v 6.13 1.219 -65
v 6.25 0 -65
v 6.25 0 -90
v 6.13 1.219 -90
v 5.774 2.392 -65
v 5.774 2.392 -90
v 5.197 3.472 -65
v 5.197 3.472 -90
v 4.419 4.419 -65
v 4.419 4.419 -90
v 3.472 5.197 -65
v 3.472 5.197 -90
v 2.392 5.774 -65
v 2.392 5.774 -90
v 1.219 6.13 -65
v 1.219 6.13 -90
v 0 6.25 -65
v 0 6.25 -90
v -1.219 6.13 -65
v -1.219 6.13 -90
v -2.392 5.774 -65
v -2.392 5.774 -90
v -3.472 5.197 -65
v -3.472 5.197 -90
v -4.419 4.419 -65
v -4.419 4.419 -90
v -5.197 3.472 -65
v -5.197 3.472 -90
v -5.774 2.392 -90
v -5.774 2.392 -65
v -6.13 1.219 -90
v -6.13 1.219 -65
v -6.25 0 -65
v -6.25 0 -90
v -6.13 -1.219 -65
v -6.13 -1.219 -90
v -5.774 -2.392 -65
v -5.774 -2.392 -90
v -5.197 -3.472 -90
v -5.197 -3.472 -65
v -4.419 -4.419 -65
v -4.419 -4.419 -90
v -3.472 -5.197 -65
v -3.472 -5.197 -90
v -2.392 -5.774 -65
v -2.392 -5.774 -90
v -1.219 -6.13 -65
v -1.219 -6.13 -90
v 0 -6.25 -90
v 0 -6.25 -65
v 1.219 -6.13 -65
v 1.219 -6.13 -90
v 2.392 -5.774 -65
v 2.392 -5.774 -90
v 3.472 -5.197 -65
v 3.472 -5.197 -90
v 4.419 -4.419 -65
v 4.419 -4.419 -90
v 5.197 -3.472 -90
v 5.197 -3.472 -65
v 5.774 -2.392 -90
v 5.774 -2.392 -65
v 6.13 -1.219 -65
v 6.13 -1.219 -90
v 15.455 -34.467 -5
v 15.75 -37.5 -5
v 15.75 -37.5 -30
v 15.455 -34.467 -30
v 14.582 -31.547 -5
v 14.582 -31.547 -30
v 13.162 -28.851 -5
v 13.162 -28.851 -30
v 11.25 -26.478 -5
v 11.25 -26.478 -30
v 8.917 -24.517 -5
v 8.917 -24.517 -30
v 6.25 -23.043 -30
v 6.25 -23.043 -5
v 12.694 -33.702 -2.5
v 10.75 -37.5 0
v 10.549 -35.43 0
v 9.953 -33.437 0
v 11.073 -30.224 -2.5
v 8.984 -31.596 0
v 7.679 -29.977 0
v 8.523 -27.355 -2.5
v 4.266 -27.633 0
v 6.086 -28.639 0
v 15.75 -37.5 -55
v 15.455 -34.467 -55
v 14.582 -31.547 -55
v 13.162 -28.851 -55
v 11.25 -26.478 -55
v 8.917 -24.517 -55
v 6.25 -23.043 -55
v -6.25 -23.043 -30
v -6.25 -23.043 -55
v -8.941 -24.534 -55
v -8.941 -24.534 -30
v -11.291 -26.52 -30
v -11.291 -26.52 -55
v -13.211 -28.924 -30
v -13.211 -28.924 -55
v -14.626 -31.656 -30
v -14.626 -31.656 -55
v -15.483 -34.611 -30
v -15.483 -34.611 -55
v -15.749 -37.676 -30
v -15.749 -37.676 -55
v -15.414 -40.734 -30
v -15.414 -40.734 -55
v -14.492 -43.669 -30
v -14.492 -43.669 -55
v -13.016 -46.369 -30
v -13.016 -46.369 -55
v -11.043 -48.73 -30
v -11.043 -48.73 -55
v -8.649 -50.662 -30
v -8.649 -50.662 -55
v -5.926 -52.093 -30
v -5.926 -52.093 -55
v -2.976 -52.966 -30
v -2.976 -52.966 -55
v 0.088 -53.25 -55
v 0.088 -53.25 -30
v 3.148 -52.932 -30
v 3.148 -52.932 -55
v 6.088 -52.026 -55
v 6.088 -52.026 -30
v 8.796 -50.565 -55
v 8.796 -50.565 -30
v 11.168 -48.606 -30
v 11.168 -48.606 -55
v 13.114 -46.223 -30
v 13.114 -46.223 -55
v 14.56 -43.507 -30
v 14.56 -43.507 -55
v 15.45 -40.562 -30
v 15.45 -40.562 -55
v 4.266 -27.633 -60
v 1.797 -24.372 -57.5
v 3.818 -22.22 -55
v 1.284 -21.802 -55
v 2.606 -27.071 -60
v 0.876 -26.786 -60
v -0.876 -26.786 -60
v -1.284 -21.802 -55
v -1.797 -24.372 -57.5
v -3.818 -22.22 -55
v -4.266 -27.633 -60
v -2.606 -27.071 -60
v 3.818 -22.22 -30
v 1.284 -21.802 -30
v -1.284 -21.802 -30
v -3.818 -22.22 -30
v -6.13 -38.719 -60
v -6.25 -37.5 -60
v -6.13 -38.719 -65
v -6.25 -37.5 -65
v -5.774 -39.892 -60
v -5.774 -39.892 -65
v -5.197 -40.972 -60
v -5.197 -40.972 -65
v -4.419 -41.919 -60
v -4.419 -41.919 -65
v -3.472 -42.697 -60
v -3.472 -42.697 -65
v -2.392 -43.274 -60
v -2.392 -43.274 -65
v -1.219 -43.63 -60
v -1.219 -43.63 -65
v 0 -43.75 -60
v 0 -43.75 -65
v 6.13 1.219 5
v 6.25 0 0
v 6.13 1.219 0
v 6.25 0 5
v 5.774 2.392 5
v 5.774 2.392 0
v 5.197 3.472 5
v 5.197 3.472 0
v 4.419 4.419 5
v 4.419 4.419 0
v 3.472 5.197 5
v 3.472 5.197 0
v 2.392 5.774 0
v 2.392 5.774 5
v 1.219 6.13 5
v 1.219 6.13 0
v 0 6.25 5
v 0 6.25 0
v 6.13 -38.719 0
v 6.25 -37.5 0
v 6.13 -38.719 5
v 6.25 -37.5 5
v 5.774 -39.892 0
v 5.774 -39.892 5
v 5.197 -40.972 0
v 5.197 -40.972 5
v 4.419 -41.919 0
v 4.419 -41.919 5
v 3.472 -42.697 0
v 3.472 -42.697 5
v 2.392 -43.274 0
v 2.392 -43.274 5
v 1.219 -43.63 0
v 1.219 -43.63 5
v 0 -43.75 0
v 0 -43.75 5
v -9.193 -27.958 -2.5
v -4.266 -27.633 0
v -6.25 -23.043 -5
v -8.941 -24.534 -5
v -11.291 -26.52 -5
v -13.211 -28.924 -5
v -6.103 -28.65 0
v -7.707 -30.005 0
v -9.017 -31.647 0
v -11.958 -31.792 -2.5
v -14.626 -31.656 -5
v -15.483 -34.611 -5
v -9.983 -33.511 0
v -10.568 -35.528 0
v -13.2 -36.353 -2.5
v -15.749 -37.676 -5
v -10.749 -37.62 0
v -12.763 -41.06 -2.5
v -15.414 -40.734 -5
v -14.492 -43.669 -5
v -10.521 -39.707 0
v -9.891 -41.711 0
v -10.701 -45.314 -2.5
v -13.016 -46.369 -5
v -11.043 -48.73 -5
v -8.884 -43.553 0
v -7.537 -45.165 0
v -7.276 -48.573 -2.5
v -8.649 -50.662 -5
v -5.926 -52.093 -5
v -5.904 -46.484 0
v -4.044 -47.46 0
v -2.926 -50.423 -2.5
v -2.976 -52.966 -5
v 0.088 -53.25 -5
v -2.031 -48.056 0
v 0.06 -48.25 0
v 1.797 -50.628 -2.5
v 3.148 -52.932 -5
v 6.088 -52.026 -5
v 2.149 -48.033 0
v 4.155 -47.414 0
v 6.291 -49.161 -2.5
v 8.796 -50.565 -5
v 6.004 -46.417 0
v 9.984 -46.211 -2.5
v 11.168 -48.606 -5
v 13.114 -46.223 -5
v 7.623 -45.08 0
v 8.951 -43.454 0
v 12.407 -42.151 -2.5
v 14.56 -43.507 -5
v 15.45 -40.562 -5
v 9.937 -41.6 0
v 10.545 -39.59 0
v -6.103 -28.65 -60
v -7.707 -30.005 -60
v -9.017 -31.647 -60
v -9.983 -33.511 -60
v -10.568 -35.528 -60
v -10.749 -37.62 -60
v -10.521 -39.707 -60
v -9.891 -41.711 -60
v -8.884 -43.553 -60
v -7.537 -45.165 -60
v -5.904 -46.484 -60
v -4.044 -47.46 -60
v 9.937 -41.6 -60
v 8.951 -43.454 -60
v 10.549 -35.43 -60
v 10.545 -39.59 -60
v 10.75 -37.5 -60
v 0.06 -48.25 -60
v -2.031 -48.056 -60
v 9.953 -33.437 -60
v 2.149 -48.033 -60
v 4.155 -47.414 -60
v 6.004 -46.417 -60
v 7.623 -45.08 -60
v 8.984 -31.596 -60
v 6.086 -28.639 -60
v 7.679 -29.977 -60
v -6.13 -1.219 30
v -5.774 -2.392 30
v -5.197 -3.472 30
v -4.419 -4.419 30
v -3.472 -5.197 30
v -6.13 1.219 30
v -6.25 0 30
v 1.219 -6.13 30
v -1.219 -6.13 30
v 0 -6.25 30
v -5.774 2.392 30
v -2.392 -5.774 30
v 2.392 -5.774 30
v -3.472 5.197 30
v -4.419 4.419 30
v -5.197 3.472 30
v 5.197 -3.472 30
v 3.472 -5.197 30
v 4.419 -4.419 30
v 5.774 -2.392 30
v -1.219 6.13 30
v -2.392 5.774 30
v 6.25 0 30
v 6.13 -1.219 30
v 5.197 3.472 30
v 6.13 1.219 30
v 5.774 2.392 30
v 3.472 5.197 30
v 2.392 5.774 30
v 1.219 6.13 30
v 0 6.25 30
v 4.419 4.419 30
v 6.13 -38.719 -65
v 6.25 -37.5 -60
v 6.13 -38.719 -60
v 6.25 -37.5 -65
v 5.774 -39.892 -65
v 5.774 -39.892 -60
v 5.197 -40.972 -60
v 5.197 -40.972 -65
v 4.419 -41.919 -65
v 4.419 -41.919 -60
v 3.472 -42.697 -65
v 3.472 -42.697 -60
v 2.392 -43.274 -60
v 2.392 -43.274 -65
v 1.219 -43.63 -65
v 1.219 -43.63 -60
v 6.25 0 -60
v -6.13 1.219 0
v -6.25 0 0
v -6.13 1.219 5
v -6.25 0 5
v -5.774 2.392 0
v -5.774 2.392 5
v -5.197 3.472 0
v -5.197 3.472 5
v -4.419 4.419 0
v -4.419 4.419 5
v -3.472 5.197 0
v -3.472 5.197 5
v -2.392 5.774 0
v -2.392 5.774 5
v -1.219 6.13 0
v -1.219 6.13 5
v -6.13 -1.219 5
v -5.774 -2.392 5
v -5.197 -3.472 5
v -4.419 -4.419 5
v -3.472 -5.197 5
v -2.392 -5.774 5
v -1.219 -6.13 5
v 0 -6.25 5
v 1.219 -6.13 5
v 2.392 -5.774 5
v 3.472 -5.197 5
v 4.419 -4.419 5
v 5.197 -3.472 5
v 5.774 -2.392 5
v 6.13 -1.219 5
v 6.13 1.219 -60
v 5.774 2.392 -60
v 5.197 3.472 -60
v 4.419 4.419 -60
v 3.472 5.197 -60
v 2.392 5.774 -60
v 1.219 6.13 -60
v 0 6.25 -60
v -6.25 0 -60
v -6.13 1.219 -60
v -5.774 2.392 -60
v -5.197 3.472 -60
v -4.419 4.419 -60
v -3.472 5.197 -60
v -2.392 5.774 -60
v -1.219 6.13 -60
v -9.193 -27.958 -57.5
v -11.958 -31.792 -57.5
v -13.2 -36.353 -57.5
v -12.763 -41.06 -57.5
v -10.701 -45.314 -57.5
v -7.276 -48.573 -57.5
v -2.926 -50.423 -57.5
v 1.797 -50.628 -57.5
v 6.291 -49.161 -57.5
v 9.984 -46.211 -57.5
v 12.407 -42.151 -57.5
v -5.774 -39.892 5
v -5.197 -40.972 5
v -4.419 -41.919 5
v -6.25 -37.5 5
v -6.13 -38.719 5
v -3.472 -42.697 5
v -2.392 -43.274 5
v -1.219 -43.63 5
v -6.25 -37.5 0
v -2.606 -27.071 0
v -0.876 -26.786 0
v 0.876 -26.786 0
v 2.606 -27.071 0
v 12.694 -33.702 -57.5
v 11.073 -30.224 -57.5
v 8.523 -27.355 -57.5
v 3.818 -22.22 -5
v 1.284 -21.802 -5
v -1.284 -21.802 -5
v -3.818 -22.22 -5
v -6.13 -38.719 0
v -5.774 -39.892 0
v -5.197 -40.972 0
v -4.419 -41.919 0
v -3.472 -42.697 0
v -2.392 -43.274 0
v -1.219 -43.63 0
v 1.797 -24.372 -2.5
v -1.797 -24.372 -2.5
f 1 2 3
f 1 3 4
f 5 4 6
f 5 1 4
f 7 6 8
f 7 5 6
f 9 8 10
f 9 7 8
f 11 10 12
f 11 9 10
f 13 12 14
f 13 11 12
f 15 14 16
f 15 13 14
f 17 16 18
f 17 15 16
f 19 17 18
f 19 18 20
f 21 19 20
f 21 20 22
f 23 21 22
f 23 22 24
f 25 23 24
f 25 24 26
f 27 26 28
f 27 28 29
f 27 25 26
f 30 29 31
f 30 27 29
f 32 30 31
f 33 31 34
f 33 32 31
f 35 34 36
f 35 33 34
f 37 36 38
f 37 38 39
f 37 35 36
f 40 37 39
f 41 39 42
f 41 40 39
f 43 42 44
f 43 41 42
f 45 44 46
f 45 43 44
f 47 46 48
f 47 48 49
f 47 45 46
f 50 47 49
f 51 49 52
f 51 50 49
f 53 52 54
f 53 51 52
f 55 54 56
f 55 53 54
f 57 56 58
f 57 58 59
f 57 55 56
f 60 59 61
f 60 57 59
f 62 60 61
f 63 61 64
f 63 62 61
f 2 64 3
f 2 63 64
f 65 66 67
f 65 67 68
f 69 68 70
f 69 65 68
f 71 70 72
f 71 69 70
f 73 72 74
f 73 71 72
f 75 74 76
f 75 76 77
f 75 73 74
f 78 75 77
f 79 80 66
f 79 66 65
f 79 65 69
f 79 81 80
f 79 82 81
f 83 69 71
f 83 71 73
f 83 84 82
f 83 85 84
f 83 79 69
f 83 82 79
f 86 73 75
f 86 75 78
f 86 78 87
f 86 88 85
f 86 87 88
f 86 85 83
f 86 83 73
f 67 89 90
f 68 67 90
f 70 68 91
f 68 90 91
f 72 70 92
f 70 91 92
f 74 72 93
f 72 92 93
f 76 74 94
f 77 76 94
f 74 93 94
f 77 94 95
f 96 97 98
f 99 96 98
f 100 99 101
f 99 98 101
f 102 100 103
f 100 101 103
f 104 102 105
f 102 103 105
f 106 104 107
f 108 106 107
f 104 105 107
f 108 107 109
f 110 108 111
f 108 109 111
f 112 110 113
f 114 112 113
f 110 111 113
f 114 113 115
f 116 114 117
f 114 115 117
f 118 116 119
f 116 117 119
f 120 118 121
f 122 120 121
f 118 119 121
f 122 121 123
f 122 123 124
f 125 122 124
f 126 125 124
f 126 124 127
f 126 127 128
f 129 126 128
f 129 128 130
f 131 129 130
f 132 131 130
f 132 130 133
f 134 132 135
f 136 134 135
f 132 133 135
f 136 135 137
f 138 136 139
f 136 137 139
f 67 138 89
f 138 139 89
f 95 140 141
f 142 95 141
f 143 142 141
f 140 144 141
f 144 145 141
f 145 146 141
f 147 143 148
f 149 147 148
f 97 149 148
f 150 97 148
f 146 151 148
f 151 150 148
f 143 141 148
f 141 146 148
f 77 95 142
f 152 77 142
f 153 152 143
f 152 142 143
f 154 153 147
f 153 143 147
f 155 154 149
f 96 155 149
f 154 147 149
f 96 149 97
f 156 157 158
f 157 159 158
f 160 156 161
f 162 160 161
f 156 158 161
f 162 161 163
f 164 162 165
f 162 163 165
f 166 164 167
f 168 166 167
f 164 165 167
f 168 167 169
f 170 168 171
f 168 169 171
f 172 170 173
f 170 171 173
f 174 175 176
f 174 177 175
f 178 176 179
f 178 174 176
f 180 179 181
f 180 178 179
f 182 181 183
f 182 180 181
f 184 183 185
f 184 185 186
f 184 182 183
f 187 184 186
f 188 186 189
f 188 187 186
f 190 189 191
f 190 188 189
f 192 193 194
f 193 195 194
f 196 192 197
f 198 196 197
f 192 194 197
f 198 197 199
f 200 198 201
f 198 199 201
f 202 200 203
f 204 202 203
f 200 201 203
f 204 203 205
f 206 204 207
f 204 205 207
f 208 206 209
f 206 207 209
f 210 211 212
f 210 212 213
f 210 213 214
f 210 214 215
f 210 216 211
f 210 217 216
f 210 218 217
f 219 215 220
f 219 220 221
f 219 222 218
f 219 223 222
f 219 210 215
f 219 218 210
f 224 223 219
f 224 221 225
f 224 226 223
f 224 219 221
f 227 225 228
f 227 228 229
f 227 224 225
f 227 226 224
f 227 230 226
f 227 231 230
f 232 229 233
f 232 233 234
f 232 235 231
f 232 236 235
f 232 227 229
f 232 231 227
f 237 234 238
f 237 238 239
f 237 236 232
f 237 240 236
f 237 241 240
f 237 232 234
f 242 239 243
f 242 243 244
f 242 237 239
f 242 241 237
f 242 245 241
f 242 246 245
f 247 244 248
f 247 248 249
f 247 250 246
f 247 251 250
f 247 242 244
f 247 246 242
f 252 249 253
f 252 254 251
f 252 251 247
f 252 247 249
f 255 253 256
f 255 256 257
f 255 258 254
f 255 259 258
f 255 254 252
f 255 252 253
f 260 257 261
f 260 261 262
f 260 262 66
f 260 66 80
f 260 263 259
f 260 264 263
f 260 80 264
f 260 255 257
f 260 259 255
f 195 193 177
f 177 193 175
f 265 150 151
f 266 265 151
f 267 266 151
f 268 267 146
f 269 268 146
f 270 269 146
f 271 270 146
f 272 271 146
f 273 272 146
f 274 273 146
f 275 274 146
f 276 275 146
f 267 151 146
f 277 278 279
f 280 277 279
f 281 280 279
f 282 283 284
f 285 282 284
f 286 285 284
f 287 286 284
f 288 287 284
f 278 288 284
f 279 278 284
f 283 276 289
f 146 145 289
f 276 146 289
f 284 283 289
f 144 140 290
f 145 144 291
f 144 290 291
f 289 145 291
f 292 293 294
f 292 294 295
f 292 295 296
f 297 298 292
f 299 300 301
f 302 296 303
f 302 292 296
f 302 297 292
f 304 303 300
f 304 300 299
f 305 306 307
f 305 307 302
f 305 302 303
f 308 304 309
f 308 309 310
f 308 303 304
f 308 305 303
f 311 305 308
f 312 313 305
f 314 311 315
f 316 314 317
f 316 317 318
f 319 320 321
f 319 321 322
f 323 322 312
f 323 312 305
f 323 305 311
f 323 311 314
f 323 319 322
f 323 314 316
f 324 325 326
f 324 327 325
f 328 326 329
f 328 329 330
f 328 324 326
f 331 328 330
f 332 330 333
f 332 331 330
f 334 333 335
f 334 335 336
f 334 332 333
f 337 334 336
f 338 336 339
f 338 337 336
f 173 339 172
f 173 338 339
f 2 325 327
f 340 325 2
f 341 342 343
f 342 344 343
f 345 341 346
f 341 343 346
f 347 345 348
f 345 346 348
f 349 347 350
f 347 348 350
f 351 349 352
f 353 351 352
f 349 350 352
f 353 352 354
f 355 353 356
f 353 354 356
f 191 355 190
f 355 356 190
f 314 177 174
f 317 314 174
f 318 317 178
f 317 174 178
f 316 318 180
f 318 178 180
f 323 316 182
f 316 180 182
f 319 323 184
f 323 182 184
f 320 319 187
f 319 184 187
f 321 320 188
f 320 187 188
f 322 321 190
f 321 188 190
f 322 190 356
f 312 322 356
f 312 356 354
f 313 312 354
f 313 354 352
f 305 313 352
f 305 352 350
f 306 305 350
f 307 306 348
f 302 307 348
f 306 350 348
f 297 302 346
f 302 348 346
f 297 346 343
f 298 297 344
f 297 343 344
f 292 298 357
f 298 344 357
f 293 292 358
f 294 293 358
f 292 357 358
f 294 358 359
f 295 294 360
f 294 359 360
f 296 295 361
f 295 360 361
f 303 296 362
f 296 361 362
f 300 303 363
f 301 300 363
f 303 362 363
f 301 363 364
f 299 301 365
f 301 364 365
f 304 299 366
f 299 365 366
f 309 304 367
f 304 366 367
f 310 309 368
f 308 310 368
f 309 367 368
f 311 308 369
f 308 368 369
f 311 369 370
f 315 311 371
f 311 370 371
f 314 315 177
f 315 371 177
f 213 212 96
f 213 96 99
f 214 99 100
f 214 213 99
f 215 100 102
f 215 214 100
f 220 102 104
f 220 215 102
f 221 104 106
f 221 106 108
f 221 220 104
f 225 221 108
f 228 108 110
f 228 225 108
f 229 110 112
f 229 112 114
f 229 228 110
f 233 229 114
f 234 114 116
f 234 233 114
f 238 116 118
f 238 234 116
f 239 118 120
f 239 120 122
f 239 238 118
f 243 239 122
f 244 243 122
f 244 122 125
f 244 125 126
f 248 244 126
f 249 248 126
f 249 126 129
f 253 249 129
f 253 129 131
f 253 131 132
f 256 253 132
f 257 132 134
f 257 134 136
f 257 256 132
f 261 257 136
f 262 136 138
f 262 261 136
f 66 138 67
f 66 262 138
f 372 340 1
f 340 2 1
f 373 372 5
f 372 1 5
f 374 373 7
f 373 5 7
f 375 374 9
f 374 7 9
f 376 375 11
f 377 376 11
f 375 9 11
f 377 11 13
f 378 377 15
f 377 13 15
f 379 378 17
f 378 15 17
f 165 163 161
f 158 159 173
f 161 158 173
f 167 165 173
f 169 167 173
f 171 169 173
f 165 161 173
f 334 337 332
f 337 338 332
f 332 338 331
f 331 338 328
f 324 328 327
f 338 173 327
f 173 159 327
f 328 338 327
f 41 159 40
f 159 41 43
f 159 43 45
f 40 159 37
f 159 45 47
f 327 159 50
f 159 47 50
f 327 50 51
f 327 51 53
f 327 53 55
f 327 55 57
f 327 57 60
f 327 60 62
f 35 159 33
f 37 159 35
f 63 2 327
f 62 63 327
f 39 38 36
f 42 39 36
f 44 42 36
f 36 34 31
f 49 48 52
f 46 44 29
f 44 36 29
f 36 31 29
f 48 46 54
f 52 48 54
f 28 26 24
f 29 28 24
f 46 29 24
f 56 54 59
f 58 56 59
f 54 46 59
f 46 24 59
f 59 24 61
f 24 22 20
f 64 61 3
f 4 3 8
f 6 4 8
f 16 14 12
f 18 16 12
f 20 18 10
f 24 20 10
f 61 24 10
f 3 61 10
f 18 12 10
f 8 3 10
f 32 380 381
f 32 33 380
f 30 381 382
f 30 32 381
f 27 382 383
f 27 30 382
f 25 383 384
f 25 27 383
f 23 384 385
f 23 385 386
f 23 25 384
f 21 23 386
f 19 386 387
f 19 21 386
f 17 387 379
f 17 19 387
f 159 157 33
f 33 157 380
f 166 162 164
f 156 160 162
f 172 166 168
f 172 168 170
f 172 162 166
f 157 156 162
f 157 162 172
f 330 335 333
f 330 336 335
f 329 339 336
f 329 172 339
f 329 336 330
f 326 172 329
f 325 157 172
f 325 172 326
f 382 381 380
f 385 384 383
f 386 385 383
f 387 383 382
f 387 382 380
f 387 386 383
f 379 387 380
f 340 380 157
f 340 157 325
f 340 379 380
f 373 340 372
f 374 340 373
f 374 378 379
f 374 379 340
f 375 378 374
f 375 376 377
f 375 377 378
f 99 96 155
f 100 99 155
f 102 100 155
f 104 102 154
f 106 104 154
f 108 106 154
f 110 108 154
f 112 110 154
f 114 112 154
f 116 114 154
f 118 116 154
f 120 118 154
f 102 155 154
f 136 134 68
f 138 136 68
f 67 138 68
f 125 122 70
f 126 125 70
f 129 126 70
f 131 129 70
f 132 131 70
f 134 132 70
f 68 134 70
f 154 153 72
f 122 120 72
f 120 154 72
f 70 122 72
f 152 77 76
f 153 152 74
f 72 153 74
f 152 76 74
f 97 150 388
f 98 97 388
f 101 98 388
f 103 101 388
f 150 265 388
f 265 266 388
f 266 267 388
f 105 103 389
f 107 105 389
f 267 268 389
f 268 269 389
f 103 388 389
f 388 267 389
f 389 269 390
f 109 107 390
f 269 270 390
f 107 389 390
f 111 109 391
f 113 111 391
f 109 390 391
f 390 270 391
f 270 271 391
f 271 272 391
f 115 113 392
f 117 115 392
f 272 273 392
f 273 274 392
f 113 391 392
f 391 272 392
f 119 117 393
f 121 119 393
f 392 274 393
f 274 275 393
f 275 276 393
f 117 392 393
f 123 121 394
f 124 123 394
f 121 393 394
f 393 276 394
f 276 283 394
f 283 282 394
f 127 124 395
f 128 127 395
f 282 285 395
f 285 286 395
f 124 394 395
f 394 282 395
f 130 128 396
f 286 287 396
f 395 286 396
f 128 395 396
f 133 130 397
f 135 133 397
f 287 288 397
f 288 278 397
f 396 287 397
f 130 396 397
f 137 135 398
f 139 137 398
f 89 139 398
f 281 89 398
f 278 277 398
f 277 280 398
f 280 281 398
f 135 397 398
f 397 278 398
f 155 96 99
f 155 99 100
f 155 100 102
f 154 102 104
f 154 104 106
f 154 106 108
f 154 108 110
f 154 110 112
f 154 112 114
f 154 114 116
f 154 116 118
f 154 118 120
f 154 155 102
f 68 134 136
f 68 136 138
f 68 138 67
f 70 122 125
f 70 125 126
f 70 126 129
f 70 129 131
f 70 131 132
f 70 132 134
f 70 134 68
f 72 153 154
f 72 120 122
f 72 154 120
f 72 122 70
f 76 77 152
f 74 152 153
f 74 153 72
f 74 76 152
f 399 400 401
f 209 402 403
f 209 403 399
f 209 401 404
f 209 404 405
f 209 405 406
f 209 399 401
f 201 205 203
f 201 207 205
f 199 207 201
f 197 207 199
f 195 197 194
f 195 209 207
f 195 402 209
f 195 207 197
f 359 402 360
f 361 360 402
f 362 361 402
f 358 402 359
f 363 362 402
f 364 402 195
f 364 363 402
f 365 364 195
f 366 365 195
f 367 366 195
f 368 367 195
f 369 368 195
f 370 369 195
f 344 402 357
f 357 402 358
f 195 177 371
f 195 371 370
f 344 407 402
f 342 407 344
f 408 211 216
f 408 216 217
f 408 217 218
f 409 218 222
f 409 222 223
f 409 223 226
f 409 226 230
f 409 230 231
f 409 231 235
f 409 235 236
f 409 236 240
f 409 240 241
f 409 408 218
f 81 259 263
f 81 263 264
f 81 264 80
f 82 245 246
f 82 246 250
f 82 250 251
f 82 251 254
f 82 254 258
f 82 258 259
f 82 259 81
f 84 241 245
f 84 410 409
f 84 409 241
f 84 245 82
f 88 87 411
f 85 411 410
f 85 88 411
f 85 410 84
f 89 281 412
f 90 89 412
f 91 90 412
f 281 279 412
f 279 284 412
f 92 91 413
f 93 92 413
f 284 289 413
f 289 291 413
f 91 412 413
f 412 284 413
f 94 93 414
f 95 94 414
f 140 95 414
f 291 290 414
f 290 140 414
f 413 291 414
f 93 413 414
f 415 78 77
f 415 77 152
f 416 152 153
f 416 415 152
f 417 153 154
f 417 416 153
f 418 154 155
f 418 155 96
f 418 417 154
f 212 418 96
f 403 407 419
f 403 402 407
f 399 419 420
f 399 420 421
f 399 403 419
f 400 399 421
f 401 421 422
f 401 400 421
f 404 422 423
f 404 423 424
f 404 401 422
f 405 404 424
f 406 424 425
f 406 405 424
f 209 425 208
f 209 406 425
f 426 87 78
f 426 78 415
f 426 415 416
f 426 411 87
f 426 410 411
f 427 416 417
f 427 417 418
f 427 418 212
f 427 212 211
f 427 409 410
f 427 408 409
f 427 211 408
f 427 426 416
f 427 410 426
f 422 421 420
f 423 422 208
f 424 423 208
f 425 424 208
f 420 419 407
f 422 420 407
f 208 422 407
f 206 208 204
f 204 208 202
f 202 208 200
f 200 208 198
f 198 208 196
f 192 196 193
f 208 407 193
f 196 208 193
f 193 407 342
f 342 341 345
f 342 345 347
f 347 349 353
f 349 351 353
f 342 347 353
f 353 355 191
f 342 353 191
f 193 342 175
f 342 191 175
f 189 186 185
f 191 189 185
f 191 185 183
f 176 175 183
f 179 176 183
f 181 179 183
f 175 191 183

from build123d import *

# Parameters (mm, degrees)
SKETCH1_R           = 6.25
BOSS_EXTRUDE1_DEPTH = 30
SKETCH1_3_W         = 12.5
SKETCH1_3_H         = 50
BOSS_EXTRUDE2_DEPTH = 5
BOSS_EXTRUDE3_DEPTH = 30
CHAMFER1_SIZE       = 5
FILLET1_R           = 6.25


with BuildPart() as part:
    # Sketch1 → Boss-Extrude1 (new body)
    with BuildSketch(Plane.XY):
        Circle(SKETCH1_R)
    extrude(amount=BOSS_EXTRUDE1_DEPTH)

    # Sketch1<3> → Boss-Extrude2 (add)
    with BuildSketch(Plane.XY):
        with Locations((0, -18.75)):
            Rectangle(SKETCH1_3_W, SKETCH1_3_H)
    extrude(amount=BOSS_EXTRUDE2_DEPTH)

    # Fillet1
    fillet1_edges = [part.edges().sort_by_distance(p)[0] for p in [
        (-6.25, -43.75, 2.5),
        (-6.25, 6.25, 2.5),
        (6.25, -43.75, 2.5),
        (6.25, 6.25, 2.5),
    ]]
    fillet(fillet1_edges, radius=FILLET1_R - 0.0001)  # a hair under: the kernel refuses the full size


with BuildPart() as body_2:
    # Sketch1<4> → Boss-Extrude3 (new body)
    with BuildSketch(Plane.XY):
        with BuildLine():
            ThreePointArc((6.25, -23.043167705), (0, -21.75), (-6.25, -23.043167705))
            Line((-6.25, -23.043167705), (-6.25, -43.75))
            Line((-6.25, -43.75), (6.25, -43.75))
            Line((6.25, -43.75), (6.25, -23.043167705))
        make_face()
        with BuildLine():
            Line((-6.25, -43.75), (-6.25, -23.043167705))
            ThreePointArc((-6.25, -23.043167705), (-8.649421946, -50.662446581), (15.75, -37.5))
            ThreePointArc((15.75, -37.5), (13.162446581, -28.850578054), (6.25, -23.043167705))
            Line((6.25, -23.043167705), (6.25, -43.75))
            Line((6.25, -43.75), (-6.25, -43.75))
        make_face()
    extrude(amount=-BOSS_EXTRUDE3_DEPTH)

    # Chamfer1
    chamfer1_edges = [body_2.edges().sort_by_distance(p)[0] for p in [
        (-15.75, -37.5, 0),
    ]]
    chamfer(chamfer1_edges, length=CHAMFER1_SIZE)


with BuildPart() as body_3:
    # Mirror1: mirrored copy
    add(body_2.part.mirror(Plane(origin=(0, 0, -30), x_dir=(1, 0, 0), z_dir=(0, 0, -1))))


with BuildPart() as body_4:
    # Mirror1 2: mirrored copy
    add(part.part.mirror(Plane(origin=(0, 0, -30), x_dir=(1, 0, 0), z_dir=(0, 0, -1))))


solid = Compound([part.part, body_2.part, body_3.part, body_4.part])
